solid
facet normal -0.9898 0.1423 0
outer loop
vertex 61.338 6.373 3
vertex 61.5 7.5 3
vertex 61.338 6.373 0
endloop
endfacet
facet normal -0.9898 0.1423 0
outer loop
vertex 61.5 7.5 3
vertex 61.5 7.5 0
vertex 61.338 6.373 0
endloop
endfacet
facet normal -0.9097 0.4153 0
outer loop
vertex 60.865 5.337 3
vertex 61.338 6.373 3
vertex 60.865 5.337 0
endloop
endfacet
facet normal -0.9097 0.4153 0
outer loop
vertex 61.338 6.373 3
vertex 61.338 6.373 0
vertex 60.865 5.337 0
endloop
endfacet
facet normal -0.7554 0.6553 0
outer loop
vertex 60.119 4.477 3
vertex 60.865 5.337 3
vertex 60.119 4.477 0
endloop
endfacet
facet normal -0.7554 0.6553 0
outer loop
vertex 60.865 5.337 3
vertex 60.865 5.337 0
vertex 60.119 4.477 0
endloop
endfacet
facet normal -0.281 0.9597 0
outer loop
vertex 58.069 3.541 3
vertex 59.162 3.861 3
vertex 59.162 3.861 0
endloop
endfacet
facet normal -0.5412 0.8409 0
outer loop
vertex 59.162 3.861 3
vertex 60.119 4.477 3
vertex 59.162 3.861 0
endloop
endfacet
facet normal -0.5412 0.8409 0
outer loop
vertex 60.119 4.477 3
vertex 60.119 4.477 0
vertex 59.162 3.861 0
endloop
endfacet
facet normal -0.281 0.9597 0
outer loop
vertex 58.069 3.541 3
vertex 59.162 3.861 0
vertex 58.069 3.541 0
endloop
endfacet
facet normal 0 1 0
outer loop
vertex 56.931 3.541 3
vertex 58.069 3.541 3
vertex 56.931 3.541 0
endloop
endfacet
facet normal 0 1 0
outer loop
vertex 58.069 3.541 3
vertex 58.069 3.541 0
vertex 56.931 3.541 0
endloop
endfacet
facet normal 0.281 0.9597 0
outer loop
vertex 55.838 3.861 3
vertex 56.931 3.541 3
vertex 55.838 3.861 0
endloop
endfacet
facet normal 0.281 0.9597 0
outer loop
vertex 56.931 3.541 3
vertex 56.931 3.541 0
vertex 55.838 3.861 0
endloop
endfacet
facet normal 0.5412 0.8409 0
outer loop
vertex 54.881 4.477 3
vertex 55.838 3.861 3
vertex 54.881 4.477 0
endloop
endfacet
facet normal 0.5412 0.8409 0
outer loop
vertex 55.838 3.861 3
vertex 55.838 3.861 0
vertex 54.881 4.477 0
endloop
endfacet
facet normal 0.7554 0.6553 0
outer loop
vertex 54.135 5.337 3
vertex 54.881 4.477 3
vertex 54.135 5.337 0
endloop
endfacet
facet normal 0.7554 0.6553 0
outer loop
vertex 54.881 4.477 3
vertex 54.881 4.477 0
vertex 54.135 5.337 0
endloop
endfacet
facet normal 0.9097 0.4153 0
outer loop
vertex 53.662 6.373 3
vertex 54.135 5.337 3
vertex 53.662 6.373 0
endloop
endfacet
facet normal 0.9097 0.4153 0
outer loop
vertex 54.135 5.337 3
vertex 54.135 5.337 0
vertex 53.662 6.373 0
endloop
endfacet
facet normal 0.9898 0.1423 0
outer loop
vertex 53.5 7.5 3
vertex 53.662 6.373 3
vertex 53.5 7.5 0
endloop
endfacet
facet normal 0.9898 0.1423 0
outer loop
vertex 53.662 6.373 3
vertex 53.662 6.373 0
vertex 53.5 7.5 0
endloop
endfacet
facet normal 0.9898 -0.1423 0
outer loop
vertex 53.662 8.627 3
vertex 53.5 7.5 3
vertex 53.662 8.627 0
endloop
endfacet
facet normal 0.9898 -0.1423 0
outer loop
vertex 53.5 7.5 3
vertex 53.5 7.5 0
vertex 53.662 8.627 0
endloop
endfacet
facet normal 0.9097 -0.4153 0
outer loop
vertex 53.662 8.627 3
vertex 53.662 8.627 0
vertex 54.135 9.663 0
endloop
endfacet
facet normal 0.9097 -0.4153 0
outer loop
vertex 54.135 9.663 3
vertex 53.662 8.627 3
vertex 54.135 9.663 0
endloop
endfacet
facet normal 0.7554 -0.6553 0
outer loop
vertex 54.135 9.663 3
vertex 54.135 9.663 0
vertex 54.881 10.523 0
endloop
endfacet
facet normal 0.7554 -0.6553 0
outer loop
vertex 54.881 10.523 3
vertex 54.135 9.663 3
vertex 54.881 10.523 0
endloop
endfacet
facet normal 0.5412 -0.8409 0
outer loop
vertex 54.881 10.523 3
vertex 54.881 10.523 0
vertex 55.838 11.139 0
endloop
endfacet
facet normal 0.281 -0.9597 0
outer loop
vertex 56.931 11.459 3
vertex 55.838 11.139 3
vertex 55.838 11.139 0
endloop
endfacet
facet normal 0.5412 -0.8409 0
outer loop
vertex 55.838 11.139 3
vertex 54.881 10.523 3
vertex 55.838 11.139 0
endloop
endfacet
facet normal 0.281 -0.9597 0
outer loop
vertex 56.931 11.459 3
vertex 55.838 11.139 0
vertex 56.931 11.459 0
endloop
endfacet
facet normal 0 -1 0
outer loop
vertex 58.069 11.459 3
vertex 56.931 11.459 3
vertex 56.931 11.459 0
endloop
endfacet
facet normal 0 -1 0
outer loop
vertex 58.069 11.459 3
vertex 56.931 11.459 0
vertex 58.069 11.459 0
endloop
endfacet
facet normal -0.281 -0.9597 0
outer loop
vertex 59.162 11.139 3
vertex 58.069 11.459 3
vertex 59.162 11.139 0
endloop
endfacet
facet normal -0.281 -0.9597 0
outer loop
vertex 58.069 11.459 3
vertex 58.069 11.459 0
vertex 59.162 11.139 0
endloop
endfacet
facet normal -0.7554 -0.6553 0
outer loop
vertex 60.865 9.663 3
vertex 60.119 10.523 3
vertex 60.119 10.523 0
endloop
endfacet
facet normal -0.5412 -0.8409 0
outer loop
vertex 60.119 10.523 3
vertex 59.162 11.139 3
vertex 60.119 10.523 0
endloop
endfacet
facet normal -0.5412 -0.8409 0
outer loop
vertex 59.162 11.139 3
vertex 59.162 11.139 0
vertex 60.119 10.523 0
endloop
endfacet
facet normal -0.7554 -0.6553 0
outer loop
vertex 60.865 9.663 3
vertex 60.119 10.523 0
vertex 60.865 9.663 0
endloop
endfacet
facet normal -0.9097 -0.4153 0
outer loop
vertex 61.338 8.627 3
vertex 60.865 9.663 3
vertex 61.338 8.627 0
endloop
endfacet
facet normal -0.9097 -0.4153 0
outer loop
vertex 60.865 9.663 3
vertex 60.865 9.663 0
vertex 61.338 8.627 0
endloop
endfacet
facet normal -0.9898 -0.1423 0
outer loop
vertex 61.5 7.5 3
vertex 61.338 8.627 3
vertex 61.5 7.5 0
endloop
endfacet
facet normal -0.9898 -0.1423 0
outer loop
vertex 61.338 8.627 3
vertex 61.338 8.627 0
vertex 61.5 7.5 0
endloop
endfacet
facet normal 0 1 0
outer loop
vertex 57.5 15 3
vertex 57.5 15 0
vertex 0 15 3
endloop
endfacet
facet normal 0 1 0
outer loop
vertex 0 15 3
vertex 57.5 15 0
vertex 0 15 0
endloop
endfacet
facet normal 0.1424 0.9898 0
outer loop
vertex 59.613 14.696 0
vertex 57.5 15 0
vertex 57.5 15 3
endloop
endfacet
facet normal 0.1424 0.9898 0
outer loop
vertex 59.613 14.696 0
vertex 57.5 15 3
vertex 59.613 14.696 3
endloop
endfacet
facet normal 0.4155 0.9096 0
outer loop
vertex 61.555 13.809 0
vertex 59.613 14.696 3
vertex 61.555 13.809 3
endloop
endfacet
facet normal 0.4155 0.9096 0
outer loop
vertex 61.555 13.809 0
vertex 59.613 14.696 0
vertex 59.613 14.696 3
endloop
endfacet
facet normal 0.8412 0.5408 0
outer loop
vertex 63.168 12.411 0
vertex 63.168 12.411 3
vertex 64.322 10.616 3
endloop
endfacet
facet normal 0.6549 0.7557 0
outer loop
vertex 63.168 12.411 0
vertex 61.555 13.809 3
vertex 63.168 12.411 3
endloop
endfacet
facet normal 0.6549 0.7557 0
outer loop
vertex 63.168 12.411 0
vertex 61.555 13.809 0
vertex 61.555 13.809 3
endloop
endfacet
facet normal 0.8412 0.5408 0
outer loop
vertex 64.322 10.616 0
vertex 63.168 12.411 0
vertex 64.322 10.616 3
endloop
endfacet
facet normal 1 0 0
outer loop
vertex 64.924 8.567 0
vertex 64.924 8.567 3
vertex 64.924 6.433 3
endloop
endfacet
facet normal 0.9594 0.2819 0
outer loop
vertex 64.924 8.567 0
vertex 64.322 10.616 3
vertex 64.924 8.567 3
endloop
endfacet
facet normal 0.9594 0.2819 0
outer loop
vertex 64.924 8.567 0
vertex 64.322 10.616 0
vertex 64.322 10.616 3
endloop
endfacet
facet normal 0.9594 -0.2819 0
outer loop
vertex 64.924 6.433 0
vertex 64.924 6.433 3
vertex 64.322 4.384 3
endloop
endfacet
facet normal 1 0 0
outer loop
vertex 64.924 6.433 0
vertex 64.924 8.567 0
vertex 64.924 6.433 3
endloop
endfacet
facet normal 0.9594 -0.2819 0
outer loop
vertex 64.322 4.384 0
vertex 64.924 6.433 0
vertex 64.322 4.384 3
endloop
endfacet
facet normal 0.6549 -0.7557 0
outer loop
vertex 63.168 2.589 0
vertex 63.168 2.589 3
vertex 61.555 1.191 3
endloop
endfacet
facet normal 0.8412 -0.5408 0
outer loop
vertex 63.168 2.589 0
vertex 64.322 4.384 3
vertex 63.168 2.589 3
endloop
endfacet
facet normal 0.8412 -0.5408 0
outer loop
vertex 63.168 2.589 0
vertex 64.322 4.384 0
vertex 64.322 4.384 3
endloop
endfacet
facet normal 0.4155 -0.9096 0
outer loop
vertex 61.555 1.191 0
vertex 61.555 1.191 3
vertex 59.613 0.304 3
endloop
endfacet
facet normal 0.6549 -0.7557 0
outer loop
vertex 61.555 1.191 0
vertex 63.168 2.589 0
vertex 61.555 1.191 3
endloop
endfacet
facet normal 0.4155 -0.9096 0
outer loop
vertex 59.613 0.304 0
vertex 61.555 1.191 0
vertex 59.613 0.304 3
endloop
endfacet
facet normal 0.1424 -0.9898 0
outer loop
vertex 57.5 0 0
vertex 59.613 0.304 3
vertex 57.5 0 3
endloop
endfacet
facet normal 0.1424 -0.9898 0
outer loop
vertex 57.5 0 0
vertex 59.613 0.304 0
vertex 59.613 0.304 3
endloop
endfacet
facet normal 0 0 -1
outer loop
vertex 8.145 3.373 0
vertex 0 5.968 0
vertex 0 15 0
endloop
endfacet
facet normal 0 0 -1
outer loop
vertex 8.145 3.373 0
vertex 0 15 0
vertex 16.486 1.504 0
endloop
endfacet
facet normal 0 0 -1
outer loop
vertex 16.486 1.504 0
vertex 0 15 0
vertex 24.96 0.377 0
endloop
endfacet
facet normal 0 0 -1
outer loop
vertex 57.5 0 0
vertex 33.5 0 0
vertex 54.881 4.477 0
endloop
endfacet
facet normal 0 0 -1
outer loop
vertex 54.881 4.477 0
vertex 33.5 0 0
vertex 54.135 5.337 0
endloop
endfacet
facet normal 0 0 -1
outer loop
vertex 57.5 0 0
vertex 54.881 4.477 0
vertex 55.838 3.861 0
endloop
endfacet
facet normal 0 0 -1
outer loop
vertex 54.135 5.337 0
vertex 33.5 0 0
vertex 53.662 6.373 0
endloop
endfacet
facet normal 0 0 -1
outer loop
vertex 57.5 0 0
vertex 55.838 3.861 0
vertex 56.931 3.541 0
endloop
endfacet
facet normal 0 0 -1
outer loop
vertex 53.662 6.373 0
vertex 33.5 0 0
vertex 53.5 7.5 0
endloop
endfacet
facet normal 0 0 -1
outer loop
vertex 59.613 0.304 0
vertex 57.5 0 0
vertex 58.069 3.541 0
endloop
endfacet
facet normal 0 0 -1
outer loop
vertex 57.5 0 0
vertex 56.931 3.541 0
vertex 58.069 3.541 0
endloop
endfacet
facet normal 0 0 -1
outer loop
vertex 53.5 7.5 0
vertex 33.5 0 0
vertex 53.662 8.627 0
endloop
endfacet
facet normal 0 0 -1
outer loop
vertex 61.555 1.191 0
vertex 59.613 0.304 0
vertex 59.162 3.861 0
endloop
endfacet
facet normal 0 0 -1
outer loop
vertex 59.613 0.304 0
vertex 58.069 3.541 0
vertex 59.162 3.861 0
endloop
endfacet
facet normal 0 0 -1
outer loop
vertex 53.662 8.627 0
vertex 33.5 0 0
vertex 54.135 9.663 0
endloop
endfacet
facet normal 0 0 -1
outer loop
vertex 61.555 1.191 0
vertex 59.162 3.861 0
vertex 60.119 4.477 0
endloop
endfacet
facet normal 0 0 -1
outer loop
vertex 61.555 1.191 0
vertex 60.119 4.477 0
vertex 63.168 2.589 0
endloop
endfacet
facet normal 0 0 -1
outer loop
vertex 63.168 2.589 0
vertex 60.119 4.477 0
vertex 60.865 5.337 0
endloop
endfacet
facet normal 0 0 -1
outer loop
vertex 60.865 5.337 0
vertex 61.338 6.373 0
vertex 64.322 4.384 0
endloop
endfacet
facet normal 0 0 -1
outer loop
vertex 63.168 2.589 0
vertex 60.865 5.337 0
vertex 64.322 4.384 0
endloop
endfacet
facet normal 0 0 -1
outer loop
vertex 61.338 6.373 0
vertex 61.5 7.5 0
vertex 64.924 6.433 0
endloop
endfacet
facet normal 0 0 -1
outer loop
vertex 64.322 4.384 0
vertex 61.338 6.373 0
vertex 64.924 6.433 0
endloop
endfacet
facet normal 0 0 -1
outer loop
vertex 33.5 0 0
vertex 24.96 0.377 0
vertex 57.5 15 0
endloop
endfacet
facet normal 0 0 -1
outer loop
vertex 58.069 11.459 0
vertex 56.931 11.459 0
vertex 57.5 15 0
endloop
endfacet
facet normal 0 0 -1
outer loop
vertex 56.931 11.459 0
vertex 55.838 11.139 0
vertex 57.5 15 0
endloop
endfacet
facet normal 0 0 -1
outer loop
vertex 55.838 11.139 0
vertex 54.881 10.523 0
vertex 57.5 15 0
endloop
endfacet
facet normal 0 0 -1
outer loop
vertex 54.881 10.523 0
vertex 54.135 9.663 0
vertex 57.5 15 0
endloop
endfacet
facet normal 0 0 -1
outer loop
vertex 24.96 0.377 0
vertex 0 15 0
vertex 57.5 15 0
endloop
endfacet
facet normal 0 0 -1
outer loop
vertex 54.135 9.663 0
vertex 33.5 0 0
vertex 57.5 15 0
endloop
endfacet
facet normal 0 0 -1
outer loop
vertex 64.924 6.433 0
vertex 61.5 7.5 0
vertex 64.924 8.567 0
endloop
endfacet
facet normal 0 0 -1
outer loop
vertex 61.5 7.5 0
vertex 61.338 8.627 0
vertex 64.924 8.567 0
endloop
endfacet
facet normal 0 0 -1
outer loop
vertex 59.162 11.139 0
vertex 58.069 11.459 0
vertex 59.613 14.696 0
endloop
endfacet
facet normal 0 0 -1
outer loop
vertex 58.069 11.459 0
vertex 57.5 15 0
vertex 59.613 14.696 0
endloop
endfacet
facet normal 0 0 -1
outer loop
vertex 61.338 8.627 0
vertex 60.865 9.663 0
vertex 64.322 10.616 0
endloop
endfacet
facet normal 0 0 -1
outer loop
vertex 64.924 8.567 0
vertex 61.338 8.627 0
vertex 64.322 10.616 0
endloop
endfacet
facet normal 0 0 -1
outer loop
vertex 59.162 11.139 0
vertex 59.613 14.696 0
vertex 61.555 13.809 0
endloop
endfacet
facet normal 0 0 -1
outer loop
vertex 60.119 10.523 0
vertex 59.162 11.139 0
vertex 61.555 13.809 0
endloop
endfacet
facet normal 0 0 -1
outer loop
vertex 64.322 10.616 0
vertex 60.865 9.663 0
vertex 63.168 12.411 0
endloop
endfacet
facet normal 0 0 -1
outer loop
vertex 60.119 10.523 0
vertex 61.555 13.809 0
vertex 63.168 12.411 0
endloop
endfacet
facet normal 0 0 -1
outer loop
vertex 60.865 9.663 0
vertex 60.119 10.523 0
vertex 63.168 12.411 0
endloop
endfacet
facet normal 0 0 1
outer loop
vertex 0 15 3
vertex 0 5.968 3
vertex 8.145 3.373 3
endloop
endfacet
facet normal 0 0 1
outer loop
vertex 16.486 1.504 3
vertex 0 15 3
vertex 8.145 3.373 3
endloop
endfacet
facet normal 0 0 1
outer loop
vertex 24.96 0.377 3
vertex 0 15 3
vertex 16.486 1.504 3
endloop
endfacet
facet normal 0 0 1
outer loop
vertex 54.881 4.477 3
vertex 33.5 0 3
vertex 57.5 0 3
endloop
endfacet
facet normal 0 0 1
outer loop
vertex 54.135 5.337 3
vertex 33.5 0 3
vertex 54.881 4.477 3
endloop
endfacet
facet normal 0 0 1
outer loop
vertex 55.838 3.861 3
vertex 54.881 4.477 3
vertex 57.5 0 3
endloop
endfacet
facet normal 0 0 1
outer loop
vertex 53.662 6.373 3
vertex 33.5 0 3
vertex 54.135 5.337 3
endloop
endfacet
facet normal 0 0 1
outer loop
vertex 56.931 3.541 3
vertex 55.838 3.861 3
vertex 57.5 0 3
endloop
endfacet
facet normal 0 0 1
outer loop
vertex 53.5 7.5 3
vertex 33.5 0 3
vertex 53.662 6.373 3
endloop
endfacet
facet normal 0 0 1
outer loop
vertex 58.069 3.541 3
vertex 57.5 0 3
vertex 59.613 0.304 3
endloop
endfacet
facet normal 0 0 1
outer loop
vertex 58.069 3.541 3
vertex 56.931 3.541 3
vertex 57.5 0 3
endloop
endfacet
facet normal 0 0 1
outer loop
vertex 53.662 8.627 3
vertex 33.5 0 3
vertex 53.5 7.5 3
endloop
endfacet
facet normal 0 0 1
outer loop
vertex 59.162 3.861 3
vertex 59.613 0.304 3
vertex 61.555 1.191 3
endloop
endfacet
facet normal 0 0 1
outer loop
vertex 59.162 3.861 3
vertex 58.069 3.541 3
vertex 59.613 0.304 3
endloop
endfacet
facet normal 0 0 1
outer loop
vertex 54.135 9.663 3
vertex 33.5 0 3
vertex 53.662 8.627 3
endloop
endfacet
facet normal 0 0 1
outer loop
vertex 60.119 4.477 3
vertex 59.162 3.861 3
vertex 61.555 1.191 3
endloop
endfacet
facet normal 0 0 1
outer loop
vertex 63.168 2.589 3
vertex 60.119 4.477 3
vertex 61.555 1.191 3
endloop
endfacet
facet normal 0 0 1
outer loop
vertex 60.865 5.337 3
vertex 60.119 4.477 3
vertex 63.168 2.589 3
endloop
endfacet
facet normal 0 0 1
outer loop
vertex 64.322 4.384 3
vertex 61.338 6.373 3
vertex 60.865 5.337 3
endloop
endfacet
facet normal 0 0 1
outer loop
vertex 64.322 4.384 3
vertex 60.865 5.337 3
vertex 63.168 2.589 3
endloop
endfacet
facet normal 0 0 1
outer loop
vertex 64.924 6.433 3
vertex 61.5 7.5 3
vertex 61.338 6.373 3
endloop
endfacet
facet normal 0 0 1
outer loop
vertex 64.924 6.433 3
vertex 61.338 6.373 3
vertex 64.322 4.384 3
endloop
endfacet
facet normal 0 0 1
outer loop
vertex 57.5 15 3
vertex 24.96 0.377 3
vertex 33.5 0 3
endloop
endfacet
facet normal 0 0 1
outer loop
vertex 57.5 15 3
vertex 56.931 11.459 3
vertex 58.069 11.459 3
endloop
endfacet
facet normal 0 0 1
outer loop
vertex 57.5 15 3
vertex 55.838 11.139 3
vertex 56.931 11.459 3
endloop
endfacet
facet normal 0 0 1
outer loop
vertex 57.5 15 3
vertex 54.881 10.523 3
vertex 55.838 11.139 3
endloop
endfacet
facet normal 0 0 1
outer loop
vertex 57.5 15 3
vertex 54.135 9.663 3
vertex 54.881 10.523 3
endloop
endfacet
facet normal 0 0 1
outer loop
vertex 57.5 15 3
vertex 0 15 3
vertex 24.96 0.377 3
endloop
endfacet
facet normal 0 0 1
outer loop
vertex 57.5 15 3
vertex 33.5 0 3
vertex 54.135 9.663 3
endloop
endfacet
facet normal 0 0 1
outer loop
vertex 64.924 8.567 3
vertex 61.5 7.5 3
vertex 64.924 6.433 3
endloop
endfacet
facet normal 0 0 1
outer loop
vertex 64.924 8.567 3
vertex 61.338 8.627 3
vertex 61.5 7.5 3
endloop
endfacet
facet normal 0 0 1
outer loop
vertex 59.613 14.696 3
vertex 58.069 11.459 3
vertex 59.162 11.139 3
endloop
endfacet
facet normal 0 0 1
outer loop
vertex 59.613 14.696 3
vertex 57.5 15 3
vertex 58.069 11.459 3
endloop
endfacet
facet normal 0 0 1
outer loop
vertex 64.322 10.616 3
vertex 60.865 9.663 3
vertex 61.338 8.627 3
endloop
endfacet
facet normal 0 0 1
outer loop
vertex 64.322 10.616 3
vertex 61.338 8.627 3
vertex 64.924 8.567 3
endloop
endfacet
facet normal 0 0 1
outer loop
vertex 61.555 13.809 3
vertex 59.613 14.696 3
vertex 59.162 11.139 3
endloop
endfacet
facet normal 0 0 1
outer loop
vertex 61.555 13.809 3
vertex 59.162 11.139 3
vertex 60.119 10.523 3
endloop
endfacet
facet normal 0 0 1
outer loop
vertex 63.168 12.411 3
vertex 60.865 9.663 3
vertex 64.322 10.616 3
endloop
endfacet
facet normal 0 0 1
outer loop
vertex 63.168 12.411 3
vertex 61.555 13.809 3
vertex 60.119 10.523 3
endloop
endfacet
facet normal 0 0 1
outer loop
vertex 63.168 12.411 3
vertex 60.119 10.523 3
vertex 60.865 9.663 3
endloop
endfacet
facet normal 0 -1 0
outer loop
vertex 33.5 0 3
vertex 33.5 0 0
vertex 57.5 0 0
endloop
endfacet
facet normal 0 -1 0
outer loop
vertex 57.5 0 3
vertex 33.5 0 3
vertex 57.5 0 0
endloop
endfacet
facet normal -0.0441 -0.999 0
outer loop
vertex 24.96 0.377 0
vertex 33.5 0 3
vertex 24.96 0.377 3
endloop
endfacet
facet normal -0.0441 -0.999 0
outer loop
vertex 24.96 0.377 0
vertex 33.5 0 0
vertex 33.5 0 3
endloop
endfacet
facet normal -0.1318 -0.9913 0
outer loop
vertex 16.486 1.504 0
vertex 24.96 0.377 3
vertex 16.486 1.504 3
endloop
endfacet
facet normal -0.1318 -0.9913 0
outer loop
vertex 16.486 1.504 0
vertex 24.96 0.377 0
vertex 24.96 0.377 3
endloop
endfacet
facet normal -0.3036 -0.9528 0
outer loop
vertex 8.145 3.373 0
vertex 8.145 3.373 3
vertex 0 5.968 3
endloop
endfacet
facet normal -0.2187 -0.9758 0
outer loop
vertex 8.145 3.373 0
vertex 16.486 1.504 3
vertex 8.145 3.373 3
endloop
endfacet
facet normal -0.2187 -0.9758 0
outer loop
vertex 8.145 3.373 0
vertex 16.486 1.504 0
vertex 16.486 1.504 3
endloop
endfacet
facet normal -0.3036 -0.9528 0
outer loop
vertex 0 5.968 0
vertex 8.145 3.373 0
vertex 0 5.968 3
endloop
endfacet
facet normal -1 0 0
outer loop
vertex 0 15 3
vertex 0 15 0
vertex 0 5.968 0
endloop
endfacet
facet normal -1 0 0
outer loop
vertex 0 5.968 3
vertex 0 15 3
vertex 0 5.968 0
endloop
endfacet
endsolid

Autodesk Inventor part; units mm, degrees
ref_plane "YZ Plane" through (0, 0, 0) normal (1, 0, 0) x (0, 1, 0)
ref_plane "XZ Plane" through (0, 0, 0) normal (0, 1, 0) x (-1, 0, 0)
ref_plane "XY Plane" through (0, 0, 0) normal (0, 0, 1) x (1, 0, 0)
sketch "草圖1" plane through (0, 0, 0) normal (0, 0, 1) x (1, 0, 0)
  line L0 (0, 0) -> (50, 0)
  line L1 (50, 0) -> (50, 15)
  line L2 (50, 15) -> (0, 15)
  line L3 (0, 15) -> (0, 0)
  circle A0 centre (57.5, 7.5) radius 7.5
  line L4 (50, 15) -> (57.5, 15)
  line L5 (50, 0) -> (57.5, 0)
  circle A1 centre (57.5, 7.5) radius 4
  arc A2 (-63.5, 97) -> (33.5, 0) centre (33.5, 97) ccw
  line L6 (33.5, 0) -> (53.5, 0)
  line L7 (53.5, 7.5) -> (53.5, 0)
  point P0 (0, 5.9684)
  point P1 (33.5, 0)
  dimension "d3" = 8
  dimension "d0" = 50
  dimension "d1" = 15
  dimension "d2" = 15
  dimension "d6" = 20
  dimension "d7" = 97
  dimension "d8" = 137.1787
extrude "擠出1" add sketch "草圖1" along normal blind 3 contours A2 L3 L2 L1 L0 | L1 A0 L7 L5 | L1 L4 A0 | A0 | L7 A0 L5
